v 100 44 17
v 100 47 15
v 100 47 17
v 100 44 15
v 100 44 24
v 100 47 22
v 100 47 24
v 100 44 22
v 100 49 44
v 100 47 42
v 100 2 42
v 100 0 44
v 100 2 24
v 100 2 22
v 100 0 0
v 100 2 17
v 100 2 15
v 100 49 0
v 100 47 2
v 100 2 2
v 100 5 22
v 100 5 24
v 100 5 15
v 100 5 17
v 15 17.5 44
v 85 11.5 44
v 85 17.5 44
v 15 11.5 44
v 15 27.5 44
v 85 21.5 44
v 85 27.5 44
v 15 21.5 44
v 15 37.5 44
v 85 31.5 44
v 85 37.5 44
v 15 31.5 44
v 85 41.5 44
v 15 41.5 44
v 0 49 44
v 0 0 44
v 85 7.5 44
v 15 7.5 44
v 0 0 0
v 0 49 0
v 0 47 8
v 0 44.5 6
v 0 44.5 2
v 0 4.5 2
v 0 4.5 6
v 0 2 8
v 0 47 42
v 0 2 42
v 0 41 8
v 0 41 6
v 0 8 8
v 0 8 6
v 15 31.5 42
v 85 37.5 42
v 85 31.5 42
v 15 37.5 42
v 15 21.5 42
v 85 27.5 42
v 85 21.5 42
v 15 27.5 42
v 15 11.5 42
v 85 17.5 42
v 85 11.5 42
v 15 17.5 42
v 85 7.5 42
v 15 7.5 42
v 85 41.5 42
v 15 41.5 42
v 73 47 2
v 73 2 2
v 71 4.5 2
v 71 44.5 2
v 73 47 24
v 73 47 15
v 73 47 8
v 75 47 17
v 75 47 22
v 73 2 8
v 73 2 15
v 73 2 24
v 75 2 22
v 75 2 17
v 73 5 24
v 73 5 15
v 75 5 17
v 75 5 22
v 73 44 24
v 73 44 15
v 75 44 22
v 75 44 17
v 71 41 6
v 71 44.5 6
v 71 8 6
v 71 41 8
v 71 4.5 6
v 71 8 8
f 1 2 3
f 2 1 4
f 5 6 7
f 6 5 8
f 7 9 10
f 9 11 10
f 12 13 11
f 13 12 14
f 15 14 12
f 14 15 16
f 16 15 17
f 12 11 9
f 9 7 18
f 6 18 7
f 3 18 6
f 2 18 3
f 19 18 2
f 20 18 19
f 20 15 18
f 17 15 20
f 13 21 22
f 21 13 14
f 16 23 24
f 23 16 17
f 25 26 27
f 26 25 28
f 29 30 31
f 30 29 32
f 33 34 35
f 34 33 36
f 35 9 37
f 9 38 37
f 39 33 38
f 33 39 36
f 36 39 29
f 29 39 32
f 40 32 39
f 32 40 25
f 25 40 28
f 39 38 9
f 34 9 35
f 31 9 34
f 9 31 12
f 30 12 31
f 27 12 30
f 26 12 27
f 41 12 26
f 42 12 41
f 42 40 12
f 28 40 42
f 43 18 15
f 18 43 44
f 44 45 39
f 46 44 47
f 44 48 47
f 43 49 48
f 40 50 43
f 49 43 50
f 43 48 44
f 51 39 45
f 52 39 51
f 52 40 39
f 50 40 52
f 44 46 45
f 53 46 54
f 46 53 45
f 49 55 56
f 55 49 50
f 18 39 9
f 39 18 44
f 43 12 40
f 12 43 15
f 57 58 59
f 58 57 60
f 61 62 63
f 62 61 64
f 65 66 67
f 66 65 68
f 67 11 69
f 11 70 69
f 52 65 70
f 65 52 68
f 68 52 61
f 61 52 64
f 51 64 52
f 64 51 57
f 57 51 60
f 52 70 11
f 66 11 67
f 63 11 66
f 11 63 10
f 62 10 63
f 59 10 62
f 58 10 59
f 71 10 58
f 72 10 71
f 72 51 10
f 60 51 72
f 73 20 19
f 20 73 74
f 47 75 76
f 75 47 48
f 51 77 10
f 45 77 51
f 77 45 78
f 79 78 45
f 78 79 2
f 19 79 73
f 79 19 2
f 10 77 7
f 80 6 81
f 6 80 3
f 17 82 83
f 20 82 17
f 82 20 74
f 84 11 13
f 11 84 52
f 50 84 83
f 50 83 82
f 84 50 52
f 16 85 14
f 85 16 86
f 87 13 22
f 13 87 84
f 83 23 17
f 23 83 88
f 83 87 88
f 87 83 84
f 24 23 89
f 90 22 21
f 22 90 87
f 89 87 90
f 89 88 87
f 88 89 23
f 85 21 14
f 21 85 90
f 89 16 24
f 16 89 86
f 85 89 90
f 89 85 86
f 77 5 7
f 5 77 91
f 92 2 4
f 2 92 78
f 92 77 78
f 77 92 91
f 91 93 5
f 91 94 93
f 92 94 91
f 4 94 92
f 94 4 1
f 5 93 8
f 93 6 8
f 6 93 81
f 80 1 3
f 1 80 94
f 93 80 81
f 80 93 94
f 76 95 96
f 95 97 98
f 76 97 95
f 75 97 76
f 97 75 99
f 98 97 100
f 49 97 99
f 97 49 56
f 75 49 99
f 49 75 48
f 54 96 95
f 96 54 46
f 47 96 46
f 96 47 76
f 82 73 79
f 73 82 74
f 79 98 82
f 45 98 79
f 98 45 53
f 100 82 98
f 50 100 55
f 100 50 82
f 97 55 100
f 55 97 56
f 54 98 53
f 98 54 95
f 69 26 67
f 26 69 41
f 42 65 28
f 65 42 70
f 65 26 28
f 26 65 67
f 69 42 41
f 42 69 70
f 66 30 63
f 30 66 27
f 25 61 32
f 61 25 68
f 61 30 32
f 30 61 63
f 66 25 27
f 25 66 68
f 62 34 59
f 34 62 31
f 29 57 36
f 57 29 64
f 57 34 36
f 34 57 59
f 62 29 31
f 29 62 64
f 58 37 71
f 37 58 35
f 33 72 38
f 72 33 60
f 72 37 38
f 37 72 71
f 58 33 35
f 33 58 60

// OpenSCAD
pcb_width = 71;
pcb_depth = 40;
pcb_height = 40;
wall_t = 2;

module scd30_holder(){
    difference(){
        cube([27, 5, 9]);
        translate([2, -1, 2]) cube([25, 7, 5]);
    }
}

module box(){
    difference(){
        cube([100, 45 + 2 * wall_t, 40 + 2 * wall_t]);
        translate([0, wall_t, wall_t]) #cube([100, 45, 40]);
    }
    
    cube([pcb_width, 4.5, 6]);
    translate([0, 44.5, 0]) cube([pcb_width, 4.5, 6]);
    translate([pcb_width, 0, 0]) cube([2, 45 + 2 * wall_t, 8]);
    translate([0, 0, 6]) cube([pcb_width, 8, 2]);
    translate([0, 41, 6]) cube([pcb_width, 8, 2]);
    
    translate([73, 0, 15]) scd30_holder();
    translate([73, 44, 15]) scd30_holder();
}

difference(){
    box();
    for(i = [0:3]){
        translate([15, 7.5 + i * 10, 41]) cube([70, 4, 4]);
    }
}
